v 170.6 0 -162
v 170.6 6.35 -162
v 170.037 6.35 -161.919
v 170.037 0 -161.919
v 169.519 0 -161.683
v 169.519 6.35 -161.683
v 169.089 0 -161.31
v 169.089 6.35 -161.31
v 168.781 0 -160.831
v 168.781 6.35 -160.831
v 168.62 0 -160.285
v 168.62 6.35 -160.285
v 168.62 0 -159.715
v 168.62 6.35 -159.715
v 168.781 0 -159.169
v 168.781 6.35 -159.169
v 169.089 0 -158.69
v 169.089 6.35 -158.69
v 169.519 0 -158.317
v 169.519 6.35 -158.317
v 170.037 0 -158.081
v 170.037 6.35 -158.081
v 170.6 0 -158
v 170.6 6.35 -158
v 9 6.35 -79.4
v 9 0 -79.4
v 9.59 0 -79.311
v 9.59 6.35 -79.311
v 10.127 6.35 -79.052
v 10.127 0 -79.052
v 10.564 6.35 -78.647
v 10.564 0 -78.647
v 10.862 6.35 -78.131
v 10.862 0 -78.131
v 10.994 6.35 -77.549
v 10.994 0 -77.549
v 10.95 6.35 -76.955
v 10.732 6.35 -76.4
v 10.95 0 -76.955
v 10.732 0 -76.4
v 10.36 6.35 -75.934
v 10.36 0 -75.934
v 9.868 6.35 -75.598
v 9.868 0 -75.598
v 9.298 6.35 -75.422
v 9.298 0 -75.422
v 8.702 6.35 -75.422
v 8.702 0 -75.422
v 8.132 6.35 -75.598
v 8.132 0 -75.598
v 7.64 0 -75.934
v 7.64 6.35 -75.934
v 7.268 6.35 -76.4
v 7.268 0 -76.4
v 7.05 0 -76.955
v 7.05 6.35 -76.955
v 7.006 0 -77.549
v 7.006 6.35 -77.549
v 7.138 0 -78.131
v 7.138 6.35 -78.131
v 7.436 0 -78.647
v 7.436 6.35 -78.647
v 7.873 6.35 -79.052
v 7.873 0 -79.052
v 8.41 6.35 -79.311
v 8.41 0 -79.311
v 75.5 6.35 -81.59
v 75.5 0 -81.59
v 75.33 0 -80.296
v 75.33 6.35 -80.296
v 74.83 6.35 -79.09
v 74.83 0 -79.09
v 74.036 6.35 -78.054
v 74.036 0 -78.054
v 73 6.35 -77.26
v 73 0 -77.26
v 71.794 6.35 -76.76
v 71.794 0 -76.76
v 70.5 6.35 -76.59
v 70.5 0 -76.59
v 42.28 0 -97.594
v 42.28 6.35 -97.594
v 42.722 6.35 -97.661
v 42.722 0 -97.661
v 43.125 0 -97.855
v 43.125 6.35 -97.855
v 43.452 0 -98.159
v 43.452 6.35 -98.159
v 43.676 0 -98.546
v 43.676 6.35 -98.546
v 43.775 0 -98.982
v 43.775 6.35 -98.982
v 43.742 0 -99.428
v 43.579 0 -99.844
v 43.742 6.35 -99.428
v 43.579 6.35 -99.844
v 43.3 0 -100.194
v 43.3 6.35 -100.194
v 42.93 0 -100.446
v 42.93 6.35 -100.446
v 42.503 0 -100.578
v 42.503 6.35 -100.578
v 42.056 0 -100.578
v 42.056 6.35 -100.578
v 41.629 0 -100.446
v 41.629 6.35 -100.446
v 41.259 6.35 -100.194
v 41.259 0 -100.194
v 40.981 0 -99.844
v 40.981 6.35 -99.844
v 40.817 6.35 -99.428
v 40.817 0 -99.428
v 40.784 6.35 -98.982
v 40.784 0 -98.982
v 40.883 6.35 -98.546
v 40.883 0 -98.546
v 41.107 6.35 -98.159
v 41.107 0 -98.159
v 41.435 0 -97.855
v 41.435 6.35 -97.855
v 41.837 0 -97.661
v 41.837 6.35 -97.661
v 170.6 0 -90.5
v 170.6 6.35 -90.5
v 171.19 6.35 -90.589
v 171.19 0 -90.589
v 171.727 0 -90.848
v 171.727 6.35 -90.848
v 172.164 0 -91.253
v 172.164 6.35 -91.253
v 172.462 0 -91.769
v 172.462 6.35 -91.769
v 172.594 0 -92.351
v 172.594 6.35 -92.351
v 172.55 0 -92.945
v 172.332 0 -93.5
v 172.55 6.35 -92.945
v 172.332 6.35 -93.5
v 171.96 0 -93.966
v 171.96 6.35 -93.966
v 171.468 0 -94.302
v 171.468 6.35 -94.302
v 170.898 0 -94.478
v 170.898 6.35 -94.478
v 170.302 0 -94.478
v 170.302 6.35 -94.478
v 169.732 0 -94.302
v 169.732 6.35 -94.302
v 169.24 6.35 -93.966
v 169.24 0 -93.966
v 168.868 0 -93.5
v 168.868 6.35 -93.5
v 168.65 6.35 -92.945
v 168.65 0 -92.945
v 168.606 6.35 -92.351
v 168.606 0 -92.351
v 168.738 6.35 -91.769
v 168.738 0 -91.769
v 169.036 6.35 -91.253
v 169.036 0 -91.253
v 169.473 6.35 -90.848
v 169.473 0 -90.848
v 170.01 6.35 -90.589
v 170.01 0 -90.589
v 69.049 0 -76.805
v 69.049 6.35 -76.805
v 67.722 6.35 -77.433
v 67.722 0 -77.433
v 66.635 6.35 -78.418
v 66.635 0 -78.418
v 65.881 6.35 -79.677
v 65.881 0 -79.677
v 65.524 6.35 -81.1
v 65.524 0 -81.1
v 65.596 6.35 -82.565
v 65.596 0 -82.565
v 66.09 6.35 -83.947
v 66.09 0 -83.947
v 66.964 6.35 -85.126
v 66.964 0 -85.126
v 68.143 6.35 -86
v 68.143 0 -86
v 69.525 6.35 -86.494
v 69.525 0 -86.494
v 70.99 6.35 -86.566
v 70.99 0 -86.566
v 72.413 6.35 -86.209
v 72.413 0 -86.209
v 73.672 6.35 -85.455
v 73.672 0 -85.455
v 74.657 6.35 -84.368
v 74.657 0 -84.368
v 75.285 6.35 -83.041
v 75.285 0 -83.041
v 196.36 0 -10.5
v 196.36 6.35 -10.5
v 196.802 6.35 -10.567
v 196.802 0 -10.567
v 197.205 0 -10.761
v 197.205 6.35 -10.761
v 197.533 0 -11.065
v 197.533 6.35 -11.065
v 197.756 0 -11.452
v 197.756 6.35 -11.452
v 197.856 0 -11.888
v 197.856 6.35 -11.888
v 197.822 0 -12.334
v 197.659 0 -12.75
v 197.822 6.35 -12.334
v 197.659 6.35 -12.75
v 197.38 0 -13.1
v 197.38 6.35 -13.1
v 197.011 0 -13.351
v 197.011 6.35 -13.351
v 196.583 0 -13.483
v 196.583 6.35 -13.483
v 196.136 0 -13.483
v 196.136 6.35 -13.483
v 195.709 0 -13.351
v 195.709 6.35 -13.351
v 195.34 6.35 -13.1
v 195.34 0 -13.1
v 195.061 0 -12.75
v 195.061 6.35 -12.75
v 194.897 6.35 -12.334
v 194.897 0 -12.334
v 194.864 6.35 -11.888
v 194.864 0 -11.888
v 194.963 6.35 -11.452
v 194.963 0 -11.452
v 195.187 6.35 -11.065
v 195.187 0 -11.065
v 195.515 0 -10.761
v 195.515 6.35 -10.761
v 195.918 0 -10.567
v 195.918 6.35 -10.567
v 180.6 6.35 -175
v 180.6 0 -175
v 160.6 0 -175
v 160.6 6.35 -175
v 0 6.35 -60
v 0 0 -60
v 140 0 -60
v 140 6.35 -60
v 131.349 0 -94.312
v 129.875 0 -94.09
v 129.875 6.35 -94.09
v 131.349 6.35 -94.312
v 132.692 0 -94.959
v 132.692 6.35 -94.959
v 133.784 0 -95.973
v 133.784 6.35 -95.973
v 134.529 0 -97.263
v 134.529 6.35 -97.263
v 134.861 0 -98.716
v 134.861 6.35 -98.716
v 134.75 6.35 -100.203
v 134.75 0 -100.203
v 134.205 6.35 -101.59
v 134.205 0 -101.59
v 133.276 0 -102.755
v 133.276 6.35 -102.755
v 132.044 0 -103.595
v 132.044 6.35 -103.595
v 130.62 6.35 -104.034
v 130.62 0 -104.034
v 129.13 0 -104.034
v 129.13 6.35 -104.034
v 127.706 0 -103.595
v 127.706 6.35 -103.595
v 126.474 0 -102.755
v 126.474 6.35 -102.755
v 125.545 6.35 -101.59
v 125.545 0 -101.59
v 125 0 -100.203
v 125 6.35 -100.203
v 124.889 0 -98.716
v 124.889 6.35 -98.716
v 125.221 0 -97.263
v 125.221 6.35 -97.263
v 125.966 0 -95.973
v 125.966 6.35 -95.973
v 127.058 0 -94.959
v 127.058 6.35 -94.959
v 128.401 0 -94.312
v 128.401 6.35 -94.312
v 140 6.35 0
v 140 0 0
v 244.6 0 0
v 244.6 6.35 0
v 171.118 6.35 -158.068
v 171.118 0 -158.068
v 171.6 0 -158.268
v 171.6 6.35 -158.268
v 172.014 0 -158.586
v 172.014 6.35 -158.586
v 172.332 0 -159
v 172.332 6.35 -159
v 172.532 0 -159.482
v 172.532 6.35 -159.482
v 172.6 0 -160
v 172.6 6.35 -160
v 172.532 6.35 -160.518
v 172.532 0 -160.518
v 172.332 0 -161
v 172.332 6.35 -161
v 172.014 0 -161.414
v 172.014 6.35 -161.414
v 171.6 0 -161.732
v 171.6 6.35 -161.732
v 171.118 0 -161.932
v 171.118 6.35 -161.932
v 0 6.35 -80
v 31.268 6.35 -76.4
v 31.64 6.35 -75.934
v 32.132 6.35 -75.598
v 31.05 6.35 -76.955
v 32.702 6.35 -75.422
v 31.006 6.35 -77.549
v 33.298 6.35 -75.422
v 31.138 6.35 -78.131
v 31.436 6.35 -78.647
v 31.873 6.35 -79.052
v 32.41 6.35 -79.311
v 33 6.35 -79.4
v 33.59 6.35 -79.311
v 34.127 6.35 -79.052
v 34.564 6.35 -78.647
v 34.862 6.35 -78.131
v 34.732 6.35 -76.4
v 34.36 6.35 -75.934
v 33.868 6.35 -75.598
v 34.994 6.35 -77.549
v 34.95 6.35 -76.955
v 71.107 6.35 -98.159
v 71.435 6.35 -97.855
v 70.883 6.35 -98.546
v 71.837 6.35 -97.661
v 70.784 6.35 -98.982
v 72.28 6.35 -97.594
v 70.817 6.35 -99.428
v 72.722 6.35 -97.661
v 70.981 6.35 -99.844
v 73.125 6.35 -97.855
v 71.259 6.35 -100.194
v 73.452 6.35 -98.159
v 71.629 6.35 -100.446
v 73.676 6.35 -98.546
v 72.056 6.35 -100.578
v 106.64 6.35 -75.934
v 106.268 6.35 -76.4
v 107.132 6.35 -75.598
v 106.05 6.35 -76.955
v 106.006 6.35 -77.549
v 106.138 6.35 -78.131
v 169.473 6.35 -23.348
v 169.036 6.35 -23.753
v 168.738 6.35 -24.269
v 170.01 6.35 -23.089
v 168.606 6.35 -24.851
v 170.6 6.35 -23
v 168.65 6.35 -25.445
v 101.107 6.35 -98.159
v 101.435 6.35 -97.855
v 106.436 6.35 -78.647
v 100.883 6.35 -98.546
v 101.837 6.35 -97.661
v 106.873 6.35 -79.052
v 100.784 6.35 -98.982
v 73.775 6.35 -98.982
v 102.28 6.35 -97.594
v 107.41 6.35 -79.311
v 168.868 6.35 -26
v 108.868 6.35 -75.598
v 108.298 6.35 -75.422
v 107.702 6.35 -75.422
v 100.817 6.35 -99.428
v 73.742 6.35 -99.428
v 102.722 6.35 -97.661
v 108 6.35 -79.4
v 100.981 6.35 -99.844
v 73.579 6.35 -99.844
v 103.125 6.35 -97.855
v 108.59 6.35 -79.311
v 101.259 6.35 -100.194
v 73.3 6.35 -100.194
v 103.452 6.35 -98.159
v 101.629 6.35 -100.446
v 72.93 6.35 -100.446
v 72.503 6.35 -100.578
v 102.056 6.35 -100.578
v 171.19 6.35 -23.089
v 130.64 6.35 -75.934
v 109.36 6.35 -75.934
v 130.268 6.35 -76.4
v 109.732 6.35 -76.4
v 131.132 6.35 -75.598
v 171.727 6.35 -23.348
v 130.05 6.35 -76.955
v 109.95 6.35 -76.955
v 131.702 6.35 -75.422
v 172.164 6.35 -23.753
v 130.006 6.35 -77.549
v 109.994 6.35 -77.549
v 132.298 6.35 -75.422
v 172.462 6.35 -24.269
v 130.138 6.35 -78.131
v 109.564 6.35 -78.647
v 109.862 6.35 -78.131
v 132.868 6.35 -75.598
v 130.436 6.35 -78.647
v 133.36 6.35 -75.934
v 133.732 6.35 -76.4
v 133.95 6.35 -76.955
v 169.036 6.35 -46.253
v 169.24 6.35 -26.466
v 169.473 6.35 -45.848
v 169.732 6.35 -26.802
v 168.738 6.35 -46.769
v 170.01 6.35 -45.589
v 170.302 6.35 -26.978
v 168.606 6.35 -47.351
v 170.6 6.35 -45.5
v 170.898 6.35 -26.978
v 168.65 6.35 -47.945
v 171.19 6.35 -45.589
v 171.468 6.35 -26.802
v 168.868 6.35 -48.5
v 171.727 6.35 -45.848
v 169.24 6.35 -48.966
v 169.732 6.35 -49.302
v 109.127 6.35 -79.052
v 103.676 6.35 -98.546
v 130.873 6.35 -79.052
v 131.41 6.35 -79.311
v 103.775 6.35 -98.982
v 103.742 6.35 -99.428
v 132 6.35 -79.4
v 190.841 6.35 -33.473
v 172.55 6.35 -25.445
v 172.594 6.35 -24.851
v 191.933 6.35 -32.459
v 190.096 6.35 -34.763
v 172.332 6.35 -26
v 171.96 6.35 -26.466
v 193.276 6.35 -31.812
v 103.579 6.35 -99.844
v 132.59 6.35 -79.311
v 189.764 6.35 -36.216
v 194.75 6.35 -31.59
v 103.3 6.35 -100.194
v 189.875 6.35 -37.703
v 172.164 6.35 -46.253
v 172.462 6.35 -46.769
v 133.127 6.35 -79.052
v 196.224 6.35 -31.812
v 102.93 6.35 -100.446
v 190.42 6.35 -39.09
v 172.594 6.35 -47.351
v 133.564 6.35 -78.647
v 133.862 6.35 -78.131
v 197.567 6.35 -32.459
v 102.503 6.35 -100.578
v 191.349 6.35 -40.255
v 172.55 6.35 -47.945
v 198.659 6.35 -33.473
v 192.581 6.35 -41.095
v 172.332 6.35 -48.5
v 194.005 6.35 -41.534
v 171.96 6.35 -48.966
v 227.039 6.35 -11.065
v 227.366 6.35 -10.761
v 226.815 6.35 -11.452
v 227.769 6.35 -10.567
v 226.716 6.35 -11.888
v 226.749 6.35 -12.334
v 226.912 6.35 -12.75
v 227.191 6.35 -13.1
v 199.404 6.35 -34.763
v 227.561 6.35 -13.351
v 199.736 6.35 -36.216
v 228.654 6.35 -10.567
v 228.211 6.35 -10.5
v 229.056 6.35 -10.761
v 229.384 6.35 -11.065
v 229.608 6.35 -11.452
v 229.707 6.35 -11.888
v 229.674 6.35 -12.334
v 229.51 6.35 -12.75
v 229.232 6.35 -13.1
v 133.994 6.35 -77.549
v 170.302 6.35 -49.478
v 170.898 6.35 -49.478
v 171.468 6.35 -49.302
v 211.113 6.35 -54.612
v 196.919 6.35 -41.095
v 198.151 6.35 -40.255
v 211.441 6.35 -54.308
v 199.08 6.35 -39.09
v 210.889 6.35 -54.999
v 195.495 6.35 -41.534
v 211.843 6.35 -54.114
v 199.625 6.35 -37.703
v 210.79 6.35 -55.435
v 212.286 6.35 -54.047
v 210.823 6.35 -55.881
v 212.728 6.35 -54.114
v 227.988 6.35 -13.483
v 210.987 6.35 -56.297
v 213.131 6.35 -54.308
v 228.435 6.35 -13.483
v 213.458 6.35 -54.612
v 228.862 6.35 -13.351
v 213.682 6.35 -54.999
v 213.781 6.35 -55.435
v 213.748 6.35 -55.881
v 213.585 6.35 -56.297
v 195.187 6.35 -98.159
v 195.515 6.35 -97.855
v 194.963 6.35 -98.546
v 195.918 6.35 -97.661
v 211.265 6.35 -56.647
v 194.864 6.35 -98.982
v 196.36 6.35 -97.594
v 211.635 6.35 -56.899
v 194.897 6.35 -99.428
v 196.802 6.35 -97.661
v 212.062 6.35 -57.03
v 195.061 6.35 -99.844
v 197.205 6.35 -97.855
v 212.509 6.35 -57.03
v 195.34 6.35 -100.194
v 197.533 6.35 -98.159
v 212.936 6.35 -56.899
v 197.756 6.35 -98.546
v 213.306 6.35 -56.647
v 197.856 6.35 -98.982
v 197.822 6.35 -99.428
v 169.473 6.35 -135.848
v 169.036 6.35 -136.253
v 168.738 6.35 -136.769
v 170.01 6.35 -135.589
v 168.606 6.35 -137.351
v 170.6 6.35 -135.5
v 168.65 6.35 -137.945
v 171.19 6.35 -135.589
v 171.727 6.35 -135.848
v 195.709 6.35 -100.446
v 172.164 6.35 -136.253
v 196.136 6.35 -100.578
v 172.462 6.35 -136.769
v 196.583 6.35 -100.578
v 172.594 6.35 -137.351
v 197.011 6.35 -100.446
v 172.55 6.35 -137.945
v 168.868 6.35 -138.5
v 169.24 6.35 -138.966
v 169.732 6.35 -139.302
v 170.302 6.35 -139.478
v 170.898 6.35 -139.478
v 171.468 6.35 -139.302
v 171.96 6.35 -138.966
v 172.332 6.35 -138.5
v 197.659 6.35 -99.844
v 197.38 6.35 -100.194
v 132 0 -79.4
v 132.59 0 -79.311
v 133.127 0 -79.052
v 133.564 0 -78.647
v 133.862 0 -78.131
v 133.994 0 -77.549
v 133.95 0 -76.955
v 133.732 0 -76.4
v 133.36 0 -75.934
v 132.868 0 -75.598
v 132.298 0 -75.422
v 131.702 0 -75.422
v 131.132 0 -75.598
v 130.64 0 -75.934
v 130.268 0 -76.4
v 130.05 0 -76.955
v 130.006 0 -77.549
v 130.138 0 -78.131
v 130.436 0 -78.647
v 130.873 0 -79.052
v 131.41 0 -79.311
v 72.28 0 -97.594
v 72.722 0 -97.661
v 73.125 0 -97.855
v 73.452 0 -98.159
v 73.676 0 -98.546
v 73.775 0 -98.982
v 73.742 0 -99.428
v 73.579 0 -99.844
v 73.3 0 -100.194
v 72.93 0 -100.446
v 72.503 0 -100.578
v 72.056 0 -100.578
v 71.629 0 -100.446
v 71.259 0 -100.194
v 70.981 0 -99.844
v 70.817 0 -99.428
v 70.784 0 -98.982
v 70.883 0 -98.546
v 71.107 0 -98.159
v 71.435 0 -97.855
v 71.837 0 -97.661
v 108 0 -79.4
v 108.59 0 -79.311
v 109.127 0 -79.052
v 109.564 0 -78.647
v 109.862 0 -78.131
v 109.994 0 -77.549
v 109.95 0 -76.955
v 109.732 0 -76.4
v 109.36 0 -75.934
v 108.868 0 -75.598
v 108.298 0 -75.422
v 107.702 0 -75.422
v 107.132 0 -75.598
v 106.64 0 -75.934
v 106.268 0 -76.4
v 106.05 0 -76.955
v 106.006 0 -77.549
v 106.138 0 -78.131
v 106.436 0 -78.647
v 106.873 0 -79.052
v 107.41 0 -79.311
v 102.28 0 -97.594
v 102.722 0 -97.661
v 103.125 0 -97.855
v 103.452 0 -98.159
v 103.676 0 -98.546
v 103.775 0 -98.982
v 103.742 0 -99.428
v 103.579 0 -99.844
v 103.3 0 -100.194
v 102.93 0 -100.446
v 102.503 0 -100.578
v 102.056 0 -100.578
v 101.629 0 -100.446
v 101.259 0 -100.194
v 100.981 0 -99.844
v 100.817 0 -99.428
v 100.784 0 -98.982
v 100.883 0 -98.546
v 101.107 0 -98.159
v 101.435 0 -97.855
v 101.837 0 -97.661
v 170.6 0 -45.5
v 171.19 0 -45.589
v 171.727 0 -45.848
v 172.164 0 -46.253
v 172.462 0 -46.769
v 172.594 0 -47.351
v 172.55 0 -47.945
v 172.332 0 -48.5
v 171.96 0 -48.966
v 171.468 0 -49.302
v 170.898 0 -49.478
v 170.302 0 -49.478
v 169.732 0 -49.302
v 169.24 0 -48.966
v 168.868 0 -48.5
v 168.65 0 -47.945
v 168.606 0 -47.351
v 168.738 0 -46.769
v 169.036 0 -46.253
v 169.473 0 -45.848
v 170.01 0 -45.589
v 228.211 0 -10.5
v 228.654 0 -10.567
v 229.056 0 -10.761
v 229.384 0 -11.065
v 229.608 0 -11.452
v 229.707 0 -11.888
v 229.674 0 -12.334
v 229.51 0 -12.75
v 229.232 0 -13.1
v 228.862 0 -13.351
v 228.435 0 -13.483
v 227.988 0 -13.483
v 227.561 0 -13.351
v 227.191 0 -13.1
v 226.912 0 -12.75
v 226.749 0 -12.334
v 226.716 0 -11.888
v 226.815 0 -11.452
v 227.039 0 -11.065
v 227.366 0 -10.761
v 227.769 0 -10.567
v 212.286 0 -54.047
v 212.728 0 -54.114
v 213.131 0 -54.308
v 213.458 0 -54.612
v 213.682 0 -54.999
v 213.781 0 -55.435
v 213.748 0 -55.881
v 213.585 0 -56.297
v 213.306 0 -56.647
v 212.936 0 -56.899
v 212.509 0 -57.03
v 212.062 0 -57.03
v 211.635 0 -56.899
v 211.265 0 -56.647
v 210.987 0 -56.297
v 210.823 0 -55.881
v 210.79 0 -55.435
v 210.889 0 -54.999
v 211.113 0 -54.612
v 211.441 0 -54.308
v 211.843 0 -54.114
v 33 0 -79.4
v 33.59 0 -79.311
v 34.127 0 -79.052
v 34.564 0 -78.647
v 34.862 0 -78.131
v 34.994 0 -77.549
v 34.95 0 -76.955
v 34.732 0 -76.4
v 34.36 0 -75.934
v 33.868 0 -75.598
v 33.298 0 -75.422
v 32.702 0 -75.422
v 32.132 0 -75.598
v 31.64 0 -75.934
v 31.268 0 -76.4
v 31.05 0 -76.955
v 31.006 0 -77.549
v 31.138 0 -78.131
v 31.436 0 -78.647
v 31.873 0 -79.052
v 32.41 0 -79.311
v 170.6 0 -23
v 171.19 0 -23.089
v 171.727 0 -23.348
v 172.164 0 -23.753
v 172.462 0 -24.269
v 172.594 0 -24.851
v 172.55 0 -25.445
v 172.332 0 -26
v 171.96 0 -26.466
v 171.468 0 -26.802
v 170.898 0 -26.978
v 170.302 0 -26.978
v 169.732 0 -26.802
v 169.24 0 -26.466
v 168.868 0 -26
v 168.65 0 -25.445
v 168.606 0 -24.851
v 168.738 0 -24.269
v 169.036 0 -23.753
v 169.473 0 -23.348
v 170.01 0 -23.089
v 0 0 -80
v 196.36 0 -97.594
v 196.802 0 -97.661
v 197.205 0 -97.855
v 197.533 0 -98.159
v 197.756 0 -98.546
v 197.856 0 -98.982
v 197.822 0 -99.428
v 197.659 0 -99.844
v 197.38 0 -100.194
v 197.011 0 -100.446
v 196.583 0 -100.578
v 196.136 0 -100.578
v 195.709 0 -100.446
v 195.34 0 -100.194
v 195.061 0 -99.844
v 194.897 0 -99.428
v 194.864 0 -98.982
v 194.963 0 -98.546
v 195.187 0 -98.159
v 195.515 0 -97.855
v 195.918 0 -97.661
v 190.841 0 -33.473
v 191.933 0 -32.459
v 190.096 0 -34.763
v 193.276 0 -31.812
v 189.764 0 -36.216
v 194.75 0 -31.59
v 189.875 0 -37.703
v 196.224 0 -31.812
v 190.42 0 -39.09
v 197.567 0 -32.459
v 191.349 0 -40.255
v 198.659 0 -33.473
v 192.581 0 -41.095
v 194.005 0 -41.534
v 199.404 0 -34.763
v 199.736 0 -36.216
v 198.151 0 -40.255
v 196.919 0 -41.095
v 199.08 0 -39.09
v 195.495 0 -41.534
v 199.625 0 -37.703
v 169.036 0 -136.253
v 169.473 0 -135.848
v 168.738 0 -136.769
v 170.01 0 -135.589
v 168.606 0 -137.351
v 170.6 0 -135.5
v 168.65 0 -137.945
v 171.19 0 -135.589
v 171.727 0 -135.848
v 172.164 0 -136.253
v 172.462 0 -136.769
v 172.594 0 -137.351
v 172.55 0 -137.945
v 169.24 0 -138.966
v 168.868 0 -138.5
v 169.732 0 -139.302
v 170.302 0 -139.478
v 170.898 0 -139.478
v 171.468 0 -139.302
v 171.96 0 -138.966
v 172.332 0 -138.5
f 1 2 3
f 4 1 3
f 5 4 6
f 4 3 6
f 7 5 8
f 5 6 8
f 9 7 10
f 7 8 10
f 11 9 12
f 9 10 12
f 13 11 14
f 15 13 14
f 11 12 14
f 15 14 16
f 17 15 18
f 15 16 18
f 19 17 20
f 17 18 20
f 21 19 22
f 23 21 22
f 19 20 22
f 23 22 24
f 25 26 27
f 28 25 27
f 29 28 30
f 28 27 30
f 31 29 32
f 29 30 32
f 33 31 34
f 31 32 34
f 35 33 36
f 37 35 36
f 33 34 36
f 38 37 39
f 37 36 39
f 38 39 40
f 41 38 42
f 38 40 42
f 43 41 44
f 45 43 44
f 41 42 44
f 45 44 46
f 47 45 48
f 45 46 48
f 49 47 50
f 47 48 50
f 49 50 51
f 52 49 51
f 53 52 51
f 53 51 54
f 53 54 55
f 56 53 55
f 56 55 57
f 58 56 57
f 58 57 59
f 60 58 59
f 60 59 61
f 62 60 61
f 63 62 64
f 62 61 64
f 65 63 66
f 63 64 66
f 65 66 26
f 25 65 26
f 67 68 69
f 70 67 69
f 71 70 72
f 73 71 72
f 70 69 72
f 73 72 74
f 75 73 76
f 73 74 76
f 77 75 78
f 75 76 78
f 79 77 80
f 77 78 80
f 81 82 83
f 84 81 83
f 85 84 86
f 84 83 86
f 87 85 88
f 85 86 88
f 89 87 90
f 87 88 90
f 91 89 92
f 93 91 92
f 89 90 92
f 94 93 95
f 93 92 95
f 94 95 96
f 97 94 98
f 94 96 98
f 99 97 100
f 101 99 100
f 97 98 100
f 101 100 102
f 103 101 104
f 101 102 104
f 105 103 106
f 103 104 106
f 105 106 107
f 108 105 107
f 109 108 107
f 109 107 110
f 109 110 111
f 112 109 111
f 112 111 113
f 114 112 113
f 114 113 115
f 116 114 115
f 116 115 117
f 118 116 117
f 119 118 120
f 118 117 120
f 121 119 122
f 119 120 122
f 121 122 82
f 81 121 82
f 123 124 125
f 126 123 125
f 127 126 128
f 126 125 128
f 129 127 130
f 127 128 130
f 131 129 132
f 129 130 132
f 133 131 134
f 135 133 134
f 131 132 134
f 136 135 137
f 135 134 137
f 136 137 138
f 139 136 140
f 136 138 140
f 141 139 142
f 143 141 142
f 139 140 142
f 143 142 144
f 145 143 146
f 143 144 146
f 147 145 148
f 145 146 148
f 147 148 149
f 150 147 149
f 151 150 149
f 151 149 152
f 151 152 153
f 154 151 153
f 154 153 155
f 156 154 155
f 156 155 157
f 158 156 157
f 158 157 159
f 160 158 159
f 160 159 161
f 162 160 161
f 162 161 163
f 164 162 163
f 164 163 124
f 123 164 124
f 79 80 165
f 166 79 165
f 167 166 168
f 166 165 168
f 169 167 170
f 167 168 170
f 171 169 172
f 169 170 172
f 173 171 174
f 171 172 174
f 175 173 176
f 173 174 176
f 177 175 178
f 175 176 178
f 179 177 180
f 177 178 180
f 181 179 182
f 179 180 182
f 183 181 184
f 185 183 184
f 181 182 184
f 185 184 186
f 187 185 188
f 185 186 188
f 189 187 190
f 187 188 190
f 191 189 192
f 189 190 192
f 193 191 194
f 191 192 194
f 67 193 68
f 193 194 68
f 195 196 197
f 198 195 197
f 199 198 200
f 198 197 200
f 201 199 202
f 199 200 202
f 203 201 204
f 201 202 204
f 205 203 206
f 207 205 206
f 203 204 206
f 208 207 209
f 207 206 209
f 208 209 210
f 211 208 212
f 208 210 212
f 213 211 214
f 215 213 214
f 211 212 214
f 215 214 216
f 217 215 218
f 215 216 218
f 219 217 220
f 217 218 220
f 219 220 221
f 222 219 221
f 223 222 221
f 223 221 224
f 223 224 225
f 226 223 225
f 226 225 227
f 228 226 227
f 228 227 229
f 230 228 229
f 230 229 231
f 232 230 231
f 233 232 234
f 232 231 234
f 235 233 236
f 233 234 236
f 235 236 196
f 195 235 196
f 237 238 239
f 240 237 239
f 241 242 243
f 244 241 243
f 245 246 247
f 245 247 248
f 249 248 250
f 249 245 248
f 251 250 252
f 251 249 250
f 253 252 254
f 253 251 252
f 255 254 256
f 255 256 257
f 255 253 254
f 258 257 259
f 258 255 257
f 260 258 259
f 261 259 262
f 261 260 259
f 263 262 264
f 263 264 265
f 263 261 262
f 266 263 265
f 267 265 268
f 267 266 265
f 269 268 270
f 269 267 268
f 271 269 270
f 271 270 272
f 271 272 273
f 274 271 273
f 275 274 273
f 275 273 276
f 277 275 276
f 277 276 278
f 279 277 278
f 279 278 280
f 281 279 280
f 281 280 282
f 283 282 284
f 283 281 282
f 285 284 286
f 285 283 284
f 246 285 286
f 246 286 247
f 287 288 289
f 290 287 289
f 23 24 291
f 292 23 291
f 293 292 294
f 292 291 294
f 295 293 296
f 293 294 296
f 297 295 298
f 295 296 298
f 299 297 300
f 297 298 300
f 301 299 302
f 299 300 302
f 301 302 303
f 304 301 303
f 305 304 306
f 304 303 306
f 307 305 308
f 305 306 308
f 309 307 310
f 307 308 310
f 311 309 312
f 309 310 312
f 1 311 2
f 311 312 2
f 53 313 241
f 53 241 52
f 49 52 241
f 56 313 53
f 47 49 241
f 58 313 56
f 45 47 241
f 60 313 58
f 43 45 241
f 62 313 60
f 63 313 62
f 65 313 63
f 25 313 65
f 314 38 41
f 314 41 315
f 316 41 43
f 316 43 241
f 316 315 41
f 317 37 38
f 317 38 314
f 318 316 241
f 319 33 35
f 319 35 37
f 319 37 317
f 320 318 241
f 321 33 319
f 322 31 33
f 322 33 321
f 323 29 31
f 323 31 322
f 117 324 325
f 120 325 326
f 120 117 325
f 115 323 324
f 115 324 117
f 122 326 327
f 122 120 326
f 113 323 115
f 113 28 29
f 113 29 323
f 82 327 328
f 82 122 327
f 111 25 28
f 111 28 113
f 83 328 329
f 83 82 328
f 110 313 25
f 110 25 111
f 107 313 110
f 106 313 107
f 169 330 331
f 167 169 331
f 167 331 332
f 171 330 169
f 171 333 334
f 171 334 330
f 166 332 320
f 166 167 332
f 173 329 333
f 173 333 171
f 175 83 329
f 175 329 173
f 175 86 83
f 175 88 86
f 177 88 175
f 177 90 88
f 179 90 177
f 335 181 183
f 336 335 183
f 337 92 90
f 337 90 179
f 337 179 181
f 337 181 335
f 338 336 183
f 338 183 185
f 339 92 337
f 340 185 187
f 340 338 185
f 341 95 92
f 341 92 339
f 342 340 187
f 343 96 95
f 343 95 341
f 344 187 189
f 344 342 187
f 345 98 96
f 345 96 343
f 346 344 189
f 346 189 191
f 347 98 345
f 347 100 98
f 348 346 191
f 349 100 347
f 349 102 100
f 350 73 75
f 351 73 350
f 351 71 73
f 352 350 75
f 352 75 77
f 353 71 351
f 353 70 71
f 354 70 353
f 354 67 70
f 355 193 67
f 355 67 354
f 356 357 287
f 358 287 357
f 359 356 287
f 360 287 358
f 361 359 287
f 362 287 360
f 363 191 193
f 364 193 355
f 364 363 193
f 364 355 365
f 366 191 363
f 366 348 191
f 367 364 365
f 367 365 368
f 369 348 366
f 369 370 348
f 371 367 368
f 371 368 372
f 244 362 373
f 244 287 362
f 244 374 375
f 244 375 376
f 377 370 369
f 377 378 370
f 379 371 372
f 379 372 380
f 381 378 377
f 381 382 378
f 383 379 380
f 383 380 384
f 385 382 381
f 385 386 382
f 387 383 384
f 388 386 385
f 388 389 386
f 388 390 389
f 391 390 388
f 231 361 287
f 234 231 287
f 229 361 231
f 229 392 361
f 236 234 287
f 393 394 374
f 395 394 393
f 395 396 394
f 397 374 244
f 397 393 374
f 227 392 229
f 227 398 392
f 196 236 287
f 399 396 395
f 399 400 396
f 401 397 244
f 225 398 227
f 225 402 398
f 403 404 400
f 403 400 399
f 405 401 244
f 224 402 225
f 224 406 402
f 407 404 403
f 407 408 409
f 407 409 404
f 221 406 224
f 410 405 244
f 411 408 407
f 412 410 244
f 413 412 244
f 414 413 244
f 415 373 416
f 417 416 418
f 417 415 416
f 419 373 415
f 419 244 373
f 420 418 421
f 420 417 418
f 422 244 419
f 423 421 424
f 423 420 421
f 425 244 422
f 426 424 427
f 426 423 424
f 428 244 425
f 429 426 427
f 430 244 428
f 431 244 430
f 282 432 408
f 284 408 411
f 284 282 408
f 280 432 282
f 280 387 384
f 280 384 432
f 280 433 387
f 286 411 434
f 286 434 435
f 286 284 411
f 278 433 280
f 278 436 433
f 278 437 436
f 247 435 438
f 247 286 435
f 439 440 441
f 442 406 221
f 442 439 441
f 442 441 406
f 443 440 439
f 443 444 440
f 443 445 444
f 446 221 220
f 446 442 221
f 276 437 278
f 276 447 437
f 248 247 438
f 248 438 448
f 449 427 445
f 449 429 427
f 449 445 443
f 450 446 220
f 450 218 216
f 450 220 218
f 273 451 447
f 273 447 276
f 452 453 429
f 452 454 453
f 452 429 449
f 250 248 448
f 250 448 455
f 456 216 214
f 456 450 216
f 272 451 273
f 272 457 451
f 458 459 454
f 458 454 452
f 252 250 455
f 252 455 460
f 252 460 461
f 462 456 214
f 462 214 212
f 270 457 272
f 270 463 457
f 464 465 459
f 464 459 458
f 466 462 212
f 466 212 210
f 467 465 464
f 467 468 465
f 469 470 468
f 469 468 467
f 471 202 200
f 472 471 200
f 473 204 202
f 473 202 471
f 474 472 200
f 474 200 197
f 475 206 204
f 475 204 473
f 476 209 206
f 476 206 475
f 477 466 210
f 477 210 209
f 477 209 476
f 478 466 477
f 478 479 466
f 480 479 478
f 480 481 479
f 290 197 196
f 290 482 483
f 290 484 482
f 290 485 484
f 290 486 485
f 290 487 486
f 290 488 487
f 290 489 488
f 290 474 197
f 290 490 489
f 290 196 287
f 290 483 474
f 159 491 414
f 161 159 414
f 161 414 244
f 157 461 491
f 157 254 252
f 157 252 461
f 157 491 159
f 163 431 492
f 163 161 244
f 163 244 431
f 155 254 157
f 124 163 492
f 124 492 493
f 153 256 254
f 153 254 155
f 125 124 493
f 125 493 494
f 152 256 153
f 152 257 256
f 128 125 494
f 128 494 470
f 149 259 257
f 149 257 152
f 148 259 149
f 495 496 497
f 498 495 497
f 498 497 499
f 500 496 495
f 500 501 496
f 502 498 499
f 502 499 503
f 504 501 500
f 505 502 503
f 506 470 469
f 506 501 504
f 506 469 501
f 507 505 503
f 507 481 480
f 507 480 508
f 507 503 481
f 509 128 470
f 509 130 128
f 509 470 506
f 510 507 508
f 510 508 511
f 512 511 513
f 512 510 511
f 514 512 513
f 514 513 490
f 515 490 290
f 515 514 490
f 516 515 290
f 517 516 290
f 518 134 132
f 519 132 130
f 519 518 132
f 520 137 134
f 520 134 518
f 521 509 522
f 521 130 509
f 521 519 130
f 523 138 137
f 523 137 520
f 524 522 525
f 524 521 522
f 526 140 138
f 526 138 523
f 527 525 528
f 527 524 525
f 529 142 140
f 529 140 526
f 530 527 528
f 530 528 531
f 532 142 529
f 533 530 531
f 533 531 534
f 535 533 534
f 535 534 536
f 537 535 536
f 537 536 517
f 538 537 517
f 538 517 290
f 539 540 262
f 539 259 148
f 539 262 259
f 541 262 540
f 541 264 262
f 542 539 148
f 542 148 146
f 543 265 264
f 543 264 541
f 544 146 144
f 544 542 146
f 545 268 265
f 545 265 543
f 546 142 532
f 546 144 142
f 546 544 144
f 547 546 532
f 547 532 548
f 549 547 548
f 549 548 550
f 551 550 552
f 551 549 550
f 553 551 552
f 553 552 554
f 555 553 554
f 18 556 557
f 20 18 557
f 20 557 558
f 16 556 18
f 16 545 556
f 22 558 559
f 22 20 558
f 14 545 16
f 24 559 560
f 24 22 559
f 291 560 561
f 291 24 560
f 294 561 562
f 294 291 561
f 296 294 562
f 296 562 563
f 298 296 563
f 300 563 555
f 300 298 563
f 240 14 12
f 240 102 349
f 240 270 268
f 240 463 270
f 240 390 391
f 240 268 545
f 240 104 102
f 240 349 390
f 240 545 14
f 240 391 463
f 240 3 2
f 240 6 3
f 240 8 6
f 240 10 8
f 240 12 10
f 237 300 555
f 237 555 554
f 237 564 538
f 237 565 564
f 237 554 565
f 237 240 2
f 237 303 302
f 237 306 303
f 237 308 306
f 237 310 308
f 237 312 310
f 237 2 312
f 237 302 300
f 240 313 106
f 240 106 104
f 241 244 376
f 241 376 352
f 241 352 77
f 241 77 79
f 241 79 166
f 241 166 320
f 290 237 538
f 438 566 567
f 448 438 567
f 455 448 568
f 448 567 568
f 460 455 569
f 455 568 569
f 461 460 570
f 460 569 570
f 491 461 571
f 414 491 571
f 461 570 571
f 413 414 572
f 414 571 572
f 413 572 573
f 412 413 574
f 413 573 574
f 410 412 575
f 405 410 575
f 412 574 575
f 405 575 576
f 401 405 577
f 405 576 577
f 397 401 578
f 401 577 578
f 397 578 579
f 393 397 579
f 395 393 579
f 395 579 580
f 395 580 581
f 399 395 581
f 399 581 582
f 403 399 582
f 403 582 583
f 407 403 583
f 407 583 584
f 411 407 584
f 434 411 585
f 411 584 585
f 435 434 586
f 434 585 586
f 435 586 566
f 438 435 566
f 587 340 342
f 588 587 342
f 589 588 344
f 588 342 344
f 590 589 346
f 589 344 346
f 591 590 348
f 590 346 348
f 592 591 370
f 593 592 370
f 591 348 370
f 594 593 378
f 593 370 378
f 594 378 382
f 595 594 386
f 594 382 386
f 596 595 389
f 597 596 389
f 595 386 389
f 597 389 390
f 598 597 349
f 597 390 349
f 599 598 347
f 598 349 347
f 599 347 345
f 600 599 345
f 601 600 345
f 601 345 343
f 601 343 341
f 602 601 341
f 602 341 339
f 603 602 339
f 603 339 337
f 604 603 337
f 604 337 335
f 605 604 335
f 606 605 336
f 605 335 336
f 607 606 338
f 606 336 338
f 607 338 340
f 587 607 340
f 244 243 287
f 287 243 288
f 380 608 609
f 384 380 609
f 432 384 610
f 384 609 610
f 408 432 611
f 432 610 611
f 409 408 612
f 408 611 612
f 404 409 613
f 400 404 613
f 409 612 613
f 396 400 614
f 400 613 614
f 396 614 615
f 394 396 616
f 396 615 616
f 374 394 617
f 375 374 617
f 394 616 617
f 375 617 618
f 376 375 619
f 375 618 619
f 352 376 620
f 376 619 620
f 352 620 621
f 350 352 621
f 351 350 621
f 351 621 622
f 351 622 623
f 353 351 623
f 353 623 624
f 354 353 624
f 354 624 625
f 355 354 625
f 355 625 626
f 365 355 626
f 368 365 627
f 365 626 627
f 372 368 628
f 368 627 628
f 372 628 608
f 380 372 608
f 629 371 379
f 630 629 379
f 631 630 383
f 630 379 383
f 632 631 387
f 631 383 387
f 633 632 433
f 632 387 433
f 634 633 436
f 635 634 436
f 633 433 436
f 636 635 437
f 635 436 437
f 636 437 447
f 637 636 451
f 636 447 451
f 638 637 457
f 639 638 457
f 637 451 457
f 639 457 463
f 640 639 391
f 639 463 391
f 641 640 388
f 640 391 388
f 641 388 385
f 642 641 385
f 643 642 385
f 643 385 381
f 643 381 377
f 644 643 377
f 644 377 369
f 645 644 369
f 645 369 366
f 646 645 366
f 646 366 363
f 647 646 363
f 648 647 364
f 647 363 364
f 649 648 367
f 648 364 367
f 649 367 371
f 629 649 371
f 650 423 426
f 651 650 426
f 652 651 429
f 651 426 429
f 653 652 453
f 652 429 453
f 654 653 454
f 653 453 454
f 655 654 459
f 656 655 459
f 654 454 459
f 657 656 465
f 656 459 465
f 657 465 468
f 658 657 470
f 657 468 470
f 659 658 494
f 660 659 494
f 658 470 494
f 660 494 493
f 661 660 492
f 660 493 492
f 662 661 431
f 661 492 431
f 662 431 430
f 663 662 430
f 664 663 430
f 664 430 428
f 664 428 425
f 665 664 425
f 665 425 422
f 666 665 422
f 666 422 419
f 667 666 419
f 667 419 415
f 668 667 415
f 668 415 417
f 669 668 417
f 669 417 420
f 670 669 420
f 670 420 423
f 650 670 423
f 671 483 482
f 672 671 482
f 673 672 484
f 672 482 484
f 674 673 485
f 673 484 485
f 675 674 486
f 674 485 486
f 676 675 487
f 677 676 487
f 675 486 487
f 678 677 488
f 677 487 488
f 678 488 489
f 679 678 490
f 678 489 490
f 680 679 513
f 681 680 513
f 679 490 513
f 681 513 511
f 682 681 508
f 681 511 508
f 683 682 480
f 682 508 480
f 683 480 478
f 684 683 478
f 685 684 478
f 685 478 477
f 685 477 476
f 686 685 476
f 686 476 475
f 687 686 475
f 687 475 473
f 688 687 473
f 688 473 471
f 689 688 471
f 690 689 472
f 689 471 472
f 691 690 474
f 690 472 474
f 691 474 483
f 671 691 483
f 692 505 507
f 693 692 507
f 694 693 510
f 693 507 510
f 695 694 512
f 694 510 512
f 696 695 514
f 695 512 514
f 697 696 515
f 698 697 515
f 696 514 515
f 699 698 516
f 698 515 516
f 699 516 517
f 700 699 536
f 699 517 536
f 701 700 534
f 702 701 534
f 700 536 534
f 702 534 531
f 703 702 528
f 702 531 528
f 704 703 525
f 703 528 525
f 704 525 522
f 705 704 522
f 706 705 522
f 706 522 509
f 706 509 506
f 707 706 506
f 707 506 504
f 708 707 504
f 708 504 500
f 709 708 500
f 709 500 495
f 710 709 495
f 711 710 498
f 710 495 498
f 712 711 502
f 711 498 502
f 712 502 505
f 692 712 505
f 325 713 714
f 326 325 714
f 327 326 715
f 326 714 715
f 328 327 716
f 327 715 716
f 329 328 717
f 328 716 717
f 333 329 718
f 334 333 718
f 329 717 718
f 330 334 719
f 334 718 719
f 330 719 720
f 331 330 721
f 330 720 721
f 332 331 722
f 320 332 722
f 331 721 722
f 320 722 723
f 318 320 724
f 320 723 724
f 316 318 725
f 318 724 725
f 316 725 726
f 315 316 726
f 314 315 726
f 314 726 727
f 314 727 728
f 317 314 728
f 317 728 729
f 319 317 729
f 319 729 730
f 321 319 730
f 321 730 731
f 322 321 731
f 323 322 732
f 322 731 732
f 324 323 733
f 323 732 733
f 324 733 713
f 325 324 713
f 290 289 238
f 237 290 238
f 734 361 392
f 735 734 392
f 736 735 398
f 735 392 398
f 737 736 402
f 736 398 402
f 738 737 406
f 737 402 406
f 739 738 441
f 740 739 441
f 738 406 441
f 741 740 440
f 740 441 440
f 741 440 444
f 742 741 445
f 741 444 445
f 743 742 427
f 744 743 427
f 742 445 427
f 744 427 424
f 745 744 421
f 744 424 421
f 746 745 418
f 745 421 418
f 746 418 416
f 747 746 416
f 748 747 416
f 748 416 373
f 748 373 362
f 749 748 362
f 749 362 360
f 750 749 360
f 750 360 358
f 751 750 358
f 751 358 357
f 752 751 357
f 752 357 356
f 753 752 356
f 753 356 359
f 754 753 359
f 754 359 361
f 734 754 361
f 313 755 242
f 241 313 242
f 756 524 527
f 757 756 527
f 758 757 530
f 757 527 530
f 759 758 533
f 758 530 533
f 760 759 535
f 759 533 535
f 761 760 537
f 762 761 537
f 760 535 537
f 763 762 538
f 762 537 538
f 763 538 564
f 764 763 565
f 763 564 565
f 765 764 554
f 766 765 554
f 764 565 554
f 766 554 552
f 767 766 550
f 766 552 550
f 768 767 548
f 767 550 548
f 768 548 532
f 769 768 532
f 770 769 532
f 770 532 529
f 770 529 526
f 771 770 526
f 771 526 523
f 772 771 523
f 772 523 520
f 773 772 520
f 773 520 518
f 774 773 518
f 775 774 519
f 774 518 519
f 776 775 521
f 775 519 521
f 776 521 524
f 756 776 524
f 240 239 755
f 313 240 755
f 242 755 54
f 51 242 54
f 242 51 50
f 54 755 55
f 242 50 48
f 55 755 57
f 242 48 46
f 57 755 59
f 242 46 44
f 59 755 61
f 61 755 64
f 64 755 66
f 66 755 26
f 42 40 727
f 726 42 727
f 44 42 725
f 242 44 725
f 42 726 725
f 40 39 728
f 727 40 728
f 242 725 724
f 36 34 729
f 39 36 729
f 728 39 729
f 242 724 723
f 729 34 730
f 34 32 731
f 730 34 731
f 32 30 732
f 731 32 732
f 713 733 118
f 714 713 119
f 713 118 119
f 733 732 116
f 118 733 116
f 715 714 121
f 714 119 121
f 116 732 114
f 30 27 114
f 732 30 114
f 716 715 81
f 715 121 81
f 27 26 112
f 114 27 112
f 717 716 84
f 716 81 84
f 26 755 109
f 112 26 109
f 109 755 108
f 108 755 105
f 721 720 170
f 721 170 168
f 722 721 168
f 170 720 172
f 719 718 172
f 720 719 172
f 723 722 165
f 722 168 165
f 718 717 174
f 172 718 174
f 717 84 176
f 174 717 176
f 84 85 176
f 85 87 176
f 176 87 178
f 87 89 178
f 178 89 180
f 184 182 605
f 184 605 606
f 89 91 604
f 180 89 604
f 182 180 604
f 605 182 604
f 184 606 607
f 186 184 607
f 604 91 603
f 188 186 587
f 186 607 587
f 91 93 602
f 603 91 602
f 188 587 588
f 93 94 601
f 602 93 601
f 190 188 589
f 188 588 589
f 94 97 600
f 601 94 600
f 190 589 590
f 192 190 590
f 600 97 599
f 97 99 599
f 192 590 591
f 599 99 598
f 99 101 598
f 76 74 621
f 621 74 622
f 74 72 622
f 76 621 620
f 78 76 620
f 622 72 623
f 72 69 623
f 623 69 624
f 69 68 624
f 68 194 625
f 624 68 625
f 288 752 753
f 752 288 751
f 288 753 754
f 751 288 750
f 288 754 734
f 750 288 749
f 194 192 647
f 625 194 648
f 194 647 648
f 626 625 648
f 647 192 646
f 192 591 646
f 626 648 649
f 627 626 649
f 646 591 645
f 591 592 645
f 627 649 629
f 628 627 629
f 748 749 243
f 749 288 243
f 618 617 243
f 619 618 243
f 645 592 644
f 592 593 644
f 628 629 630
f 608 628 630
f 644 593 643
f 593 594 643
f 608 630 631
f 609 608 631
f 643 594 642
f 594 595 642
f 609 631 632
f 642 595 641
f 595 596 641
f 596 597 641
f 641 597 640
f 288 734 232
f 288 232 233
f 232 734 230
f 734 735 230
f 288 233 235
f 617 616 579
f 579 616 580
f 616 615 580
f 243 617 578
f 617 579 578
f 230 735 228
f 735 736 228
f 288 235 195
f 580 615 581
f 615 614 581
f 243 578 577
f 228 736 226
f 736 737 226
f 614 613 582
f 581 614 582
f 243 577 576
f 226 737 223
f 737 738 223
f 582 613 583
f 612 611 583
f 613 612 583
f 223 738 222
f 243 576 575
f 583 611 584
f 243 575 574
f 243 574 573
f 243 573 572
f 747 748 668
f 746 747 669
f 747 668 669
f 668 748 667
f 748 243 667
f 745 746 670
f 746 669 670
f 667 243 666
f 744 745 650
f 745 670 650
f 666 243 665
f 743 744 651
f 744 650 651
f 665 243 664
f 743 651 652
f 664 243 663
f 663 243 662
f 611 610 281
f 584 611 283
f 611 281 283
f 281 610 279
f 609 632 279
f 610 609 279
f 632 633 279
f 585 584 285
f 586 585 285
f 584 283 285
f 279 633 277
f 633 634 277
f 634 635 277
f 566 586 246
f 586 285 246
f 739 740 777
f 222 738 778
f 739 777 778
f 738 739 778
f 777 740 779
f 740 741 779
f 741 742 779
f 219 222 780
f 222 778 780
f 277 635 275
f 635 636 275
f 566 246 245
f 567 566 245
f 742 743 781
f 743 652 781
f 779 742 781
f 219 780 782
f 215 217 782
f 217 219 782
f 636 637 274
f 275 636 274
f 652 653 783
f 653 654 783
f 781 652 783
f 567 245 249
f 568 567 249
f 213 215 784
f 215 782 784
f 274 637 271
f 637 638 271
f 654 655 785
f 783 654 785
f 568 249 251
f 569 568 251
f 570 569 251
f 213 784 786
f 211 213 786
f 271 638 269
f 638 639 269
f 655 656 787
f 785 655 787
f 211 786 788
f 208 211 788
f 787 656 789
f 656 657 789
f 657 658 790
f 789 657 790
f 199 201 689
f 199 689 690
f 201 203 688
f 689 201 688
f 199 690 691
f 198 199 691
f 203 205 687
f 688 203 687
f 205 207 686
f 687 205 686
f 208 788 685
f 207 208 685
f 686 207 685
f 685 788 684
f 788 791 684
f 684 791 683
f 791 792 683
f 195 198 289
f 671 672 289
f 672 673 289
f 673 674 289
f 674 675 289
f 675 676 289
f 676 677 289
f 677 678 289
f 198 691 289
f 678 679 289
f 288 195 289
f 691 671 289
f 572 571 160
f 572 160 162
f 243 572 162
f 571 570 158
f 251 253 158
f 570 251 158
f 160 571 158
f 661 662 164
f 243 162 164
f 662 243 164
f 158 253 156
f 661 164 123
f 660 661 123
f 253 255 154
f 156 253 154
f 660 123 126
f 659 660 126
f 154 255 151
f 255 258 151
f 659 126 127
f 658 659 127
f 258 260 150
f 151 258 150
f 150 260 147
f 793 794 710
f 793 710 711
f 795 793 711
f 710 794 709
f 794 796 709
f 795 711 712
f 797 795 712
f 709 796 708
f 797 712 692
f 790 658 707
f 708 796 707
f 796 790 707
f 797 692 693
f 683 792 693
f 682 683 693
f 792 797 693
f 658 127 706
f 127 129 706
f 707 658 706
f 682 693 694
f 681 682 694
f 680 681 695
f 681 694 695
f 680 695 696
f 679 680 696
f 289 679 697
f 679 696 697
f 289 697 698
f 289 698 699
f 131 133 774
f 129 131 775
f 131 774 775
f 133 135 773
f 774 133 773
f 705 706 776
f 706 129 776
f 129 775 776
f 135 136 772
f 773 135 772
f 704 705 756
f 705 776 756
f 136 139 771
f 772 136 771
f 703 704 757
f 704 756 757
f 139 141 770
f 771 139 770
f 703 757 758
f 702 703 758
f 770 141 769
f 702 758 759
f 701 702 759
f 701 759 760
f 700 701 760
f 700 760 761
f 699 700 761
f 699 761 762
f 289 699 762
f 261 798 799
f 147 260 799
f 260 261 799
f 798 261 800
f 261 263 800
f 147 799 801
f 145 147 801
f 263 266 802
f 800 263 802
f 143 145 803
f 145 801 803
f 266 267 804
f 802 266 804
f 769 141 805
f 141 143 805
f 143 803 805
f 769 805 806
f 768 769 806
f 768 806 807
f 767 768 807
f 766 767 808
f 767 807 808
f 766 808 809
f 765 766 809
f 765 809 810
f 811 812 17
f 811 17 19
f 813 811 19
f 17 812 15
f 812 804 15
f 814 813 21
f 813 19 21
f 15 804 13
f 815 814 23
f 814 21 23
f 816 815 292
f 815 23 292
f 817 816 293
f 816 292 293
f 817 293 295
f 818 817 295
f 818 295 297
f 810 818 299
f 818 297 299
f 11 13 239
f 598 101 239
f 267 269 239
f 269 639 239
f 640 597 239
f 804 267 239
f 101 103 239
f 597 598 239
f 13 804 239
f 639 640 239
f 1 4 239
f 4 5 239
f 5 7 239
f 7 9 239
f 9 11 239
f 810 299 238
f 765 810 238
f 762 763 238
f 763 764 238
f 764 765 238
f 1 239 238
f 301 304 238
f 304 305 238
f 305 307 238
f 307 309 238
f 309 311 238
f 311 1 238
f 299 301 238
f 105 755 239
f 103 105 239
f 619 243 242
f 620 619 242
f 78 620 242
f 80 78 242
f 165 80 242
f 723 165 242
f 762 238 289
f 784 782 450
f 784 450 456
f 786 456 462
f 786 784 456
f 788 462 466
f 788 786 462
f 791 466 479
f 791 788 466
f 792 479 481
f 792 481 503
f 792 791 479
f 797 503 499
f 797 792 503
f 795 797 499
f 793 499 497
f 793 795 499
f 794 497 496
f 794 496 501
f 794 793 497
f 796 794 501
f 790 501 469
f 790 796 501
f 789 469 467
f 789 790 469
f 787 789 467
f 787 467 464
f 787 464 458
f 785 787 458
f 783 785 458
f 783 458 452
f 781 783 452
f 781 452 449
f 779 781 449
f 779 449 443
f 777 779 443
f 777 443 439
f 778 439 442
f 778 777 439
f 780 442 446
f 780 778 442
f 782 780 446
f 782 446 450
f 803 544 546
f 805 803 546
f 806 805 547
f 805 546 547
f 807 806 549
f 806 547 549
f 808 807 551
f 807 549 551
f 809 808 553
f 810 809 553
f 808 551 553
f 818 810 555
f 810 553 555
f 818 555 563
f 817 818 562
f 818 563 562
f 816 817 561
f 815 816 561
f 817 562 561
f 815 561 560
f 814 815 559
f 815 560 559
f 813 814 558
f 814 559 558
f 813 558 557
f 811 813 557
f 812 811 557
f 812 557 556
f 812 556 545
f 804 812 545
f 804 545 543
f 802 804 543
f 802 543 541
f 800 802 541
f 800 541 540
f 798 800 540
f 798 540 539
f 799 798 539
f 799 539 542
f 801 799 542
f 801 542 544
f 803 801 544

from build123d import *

# Parameters (mm, degrees)
SKETCH1_R           = 5
BOSS_EXTRUDE2_DEPTH = 6.35
SKETCH3_R           = 1.5
CUT_EXTRUDE1_DEPTH  = 6.35
SKETCH4_R           = 2
CUT_EXTRUDE2_DEPTH  = 10
SKETCH6_R           = 2
CUT_EXTRUDE3_DEPTH  = 6.35


with BuildPart() as part:
    # Sketch1 → Boss-Extrude2 (new body)
    with BuildSketch(Plane(origin=(0, 0, 0), x_dir=(1, 0, 0), z_dir=(0, 1, 0))):
        Polygon((180.6, 175), (160.6, 175), (0, 80), (0, 60), (70.5, 60), (140, 60), (140, 0), (194.75, 0), (244.6, 0), align=None)
        with Locations(Location((194.75, 36.59, 0), (0, 0, 270))):
            Circle(SKETCH1_R, mode=Mode.SUBTRACT)
        with BuildLine():
            ThreePointArc((75.5, 81.59), (74.035533906, 78.054466094), (70.5, 76.59))
            ThreePointArc((70.5, 76.59), (66.964466094, 85.125533906), (75.5, 81.59))
        make_face(mode=Mode.SUBTRACT)
        with Locations(Location((129.875, 99.09, 0), (0, 0, 270))):
            Circle(SKETCH1_R, mode=Mode.SUBTRACT)
    extrude(amount=BOSS_EXTRUDE2_DEPTH)

    # Sketch3 → Cut-Extrude1 (cut)
    with BuildSketch(Plane(origin=(0, 6.35, 0), x_dir=(1, 0, 0), z_dir=(0, 1, 0))):
        with Locations(Location((42.27958751, 99.09440108, 0), (0, 0, 270))):
            Circle(SKETCH3_R)
        with Locations(Location((196.359761891, 12, 0), (0, 0, 270))):
            Circle(SKETCH3_R)
        with Locations(Location((228.211428571, 12, 0), (0, 0, 270))):
            Circle(SKETCH3_R)
        with Locations(Location((212.285595231, 55.54720054, 0), (0, 0, 270))):
            Circle(SKETCH3_R)
        with Locations(Location((196.359761891, 99.09440108, 0), (0, 0, 270))):
            Circle(SKETCH3_R)
        with Locations(Location((102.27958751, 99.09440108, 0), (0, 0, 270))):
            Circle(SKETCH3_R)
        with Locations(Location((72.27958751, 99.09440108, 0), (0, 0, 270))):
            Circle(SKETCH3_R)
    extrude(amount=-CUT_EXTRUDE1_DEPTH, mode=Mode.SUBTRACT)

    # Sketch4 → Cut-Extrude2 (cut)
    with BuildSketch(Plane(origin=(0, 6.35, 0), x_dir=(1, 0, 0), z_dir=(0, 1, 0))):
        with BuildLine():
            ThreePointArc((172.6, 160), (172.014213562, 161.414213562), (170.6, 162))
            Line((170.6, 162), (170.6, 160))
            Line((170.6, 160), (170.6, 158))
            ThreePointArc((170.6, 158), (172.014213562, 158.585786438), (172.6, 160))
        make_face()
        with BuildLine():
            Line((170.6, 160), (170.6, 162))
            ThreePointArc((170.6, 162), (168.6, 160), (170.6, 158))
            Line((170.6, 158), (170.6, 160))
        make_face()
        with Locations(Location((170.6, 137.5, 0), (0, 0, 270))):
            Circle(SKETCH4_R)
        with Locations(Location((170.6, 92.5, 0), (0, 0, 270))):
            Circle(SKETCH4_R)
        with Locations(Location((170.6, 47.5, 0), (0, 0, 270))):
            Circle(SKETCH4_R)
        with Locations(Location((170.6, 25, 0), (0, 0, 270))):
            Circle(SKETCH4_R)
    extrude(amount=-CUT_EXTRUDE2_DEPTH, mode=Mode.SUBTRACT)

    # Sketch6 → Cut-Extrude3 (cut)
    with BuildSketch(Plane(origin=(0, 0, 0), x_dir=(-1, 0, 0), z_dir=(0, -1, 0))):
        with Locations(Location((-132, 77.4, 0), (0, 0, 90))):
            Circle(SKETCH6_R)
        with Locations(Location((-108, 77.4, 0), (0, 0, 90))):
            Circle(SKETCH6_R)
        with Locations(Location((-33, 77.4, 0), (0, 0, 90))):
            Circle(SKETCH6_R)
        with Locations(Location((-9, 77.4, 0), (0, 0, 90))):
            Circle(SKETCH6_R)
    extrude(amount=-CUT_EXTRUDE3_DEPTH, mode=Mode.SUBTRACT)


solid = part.part
